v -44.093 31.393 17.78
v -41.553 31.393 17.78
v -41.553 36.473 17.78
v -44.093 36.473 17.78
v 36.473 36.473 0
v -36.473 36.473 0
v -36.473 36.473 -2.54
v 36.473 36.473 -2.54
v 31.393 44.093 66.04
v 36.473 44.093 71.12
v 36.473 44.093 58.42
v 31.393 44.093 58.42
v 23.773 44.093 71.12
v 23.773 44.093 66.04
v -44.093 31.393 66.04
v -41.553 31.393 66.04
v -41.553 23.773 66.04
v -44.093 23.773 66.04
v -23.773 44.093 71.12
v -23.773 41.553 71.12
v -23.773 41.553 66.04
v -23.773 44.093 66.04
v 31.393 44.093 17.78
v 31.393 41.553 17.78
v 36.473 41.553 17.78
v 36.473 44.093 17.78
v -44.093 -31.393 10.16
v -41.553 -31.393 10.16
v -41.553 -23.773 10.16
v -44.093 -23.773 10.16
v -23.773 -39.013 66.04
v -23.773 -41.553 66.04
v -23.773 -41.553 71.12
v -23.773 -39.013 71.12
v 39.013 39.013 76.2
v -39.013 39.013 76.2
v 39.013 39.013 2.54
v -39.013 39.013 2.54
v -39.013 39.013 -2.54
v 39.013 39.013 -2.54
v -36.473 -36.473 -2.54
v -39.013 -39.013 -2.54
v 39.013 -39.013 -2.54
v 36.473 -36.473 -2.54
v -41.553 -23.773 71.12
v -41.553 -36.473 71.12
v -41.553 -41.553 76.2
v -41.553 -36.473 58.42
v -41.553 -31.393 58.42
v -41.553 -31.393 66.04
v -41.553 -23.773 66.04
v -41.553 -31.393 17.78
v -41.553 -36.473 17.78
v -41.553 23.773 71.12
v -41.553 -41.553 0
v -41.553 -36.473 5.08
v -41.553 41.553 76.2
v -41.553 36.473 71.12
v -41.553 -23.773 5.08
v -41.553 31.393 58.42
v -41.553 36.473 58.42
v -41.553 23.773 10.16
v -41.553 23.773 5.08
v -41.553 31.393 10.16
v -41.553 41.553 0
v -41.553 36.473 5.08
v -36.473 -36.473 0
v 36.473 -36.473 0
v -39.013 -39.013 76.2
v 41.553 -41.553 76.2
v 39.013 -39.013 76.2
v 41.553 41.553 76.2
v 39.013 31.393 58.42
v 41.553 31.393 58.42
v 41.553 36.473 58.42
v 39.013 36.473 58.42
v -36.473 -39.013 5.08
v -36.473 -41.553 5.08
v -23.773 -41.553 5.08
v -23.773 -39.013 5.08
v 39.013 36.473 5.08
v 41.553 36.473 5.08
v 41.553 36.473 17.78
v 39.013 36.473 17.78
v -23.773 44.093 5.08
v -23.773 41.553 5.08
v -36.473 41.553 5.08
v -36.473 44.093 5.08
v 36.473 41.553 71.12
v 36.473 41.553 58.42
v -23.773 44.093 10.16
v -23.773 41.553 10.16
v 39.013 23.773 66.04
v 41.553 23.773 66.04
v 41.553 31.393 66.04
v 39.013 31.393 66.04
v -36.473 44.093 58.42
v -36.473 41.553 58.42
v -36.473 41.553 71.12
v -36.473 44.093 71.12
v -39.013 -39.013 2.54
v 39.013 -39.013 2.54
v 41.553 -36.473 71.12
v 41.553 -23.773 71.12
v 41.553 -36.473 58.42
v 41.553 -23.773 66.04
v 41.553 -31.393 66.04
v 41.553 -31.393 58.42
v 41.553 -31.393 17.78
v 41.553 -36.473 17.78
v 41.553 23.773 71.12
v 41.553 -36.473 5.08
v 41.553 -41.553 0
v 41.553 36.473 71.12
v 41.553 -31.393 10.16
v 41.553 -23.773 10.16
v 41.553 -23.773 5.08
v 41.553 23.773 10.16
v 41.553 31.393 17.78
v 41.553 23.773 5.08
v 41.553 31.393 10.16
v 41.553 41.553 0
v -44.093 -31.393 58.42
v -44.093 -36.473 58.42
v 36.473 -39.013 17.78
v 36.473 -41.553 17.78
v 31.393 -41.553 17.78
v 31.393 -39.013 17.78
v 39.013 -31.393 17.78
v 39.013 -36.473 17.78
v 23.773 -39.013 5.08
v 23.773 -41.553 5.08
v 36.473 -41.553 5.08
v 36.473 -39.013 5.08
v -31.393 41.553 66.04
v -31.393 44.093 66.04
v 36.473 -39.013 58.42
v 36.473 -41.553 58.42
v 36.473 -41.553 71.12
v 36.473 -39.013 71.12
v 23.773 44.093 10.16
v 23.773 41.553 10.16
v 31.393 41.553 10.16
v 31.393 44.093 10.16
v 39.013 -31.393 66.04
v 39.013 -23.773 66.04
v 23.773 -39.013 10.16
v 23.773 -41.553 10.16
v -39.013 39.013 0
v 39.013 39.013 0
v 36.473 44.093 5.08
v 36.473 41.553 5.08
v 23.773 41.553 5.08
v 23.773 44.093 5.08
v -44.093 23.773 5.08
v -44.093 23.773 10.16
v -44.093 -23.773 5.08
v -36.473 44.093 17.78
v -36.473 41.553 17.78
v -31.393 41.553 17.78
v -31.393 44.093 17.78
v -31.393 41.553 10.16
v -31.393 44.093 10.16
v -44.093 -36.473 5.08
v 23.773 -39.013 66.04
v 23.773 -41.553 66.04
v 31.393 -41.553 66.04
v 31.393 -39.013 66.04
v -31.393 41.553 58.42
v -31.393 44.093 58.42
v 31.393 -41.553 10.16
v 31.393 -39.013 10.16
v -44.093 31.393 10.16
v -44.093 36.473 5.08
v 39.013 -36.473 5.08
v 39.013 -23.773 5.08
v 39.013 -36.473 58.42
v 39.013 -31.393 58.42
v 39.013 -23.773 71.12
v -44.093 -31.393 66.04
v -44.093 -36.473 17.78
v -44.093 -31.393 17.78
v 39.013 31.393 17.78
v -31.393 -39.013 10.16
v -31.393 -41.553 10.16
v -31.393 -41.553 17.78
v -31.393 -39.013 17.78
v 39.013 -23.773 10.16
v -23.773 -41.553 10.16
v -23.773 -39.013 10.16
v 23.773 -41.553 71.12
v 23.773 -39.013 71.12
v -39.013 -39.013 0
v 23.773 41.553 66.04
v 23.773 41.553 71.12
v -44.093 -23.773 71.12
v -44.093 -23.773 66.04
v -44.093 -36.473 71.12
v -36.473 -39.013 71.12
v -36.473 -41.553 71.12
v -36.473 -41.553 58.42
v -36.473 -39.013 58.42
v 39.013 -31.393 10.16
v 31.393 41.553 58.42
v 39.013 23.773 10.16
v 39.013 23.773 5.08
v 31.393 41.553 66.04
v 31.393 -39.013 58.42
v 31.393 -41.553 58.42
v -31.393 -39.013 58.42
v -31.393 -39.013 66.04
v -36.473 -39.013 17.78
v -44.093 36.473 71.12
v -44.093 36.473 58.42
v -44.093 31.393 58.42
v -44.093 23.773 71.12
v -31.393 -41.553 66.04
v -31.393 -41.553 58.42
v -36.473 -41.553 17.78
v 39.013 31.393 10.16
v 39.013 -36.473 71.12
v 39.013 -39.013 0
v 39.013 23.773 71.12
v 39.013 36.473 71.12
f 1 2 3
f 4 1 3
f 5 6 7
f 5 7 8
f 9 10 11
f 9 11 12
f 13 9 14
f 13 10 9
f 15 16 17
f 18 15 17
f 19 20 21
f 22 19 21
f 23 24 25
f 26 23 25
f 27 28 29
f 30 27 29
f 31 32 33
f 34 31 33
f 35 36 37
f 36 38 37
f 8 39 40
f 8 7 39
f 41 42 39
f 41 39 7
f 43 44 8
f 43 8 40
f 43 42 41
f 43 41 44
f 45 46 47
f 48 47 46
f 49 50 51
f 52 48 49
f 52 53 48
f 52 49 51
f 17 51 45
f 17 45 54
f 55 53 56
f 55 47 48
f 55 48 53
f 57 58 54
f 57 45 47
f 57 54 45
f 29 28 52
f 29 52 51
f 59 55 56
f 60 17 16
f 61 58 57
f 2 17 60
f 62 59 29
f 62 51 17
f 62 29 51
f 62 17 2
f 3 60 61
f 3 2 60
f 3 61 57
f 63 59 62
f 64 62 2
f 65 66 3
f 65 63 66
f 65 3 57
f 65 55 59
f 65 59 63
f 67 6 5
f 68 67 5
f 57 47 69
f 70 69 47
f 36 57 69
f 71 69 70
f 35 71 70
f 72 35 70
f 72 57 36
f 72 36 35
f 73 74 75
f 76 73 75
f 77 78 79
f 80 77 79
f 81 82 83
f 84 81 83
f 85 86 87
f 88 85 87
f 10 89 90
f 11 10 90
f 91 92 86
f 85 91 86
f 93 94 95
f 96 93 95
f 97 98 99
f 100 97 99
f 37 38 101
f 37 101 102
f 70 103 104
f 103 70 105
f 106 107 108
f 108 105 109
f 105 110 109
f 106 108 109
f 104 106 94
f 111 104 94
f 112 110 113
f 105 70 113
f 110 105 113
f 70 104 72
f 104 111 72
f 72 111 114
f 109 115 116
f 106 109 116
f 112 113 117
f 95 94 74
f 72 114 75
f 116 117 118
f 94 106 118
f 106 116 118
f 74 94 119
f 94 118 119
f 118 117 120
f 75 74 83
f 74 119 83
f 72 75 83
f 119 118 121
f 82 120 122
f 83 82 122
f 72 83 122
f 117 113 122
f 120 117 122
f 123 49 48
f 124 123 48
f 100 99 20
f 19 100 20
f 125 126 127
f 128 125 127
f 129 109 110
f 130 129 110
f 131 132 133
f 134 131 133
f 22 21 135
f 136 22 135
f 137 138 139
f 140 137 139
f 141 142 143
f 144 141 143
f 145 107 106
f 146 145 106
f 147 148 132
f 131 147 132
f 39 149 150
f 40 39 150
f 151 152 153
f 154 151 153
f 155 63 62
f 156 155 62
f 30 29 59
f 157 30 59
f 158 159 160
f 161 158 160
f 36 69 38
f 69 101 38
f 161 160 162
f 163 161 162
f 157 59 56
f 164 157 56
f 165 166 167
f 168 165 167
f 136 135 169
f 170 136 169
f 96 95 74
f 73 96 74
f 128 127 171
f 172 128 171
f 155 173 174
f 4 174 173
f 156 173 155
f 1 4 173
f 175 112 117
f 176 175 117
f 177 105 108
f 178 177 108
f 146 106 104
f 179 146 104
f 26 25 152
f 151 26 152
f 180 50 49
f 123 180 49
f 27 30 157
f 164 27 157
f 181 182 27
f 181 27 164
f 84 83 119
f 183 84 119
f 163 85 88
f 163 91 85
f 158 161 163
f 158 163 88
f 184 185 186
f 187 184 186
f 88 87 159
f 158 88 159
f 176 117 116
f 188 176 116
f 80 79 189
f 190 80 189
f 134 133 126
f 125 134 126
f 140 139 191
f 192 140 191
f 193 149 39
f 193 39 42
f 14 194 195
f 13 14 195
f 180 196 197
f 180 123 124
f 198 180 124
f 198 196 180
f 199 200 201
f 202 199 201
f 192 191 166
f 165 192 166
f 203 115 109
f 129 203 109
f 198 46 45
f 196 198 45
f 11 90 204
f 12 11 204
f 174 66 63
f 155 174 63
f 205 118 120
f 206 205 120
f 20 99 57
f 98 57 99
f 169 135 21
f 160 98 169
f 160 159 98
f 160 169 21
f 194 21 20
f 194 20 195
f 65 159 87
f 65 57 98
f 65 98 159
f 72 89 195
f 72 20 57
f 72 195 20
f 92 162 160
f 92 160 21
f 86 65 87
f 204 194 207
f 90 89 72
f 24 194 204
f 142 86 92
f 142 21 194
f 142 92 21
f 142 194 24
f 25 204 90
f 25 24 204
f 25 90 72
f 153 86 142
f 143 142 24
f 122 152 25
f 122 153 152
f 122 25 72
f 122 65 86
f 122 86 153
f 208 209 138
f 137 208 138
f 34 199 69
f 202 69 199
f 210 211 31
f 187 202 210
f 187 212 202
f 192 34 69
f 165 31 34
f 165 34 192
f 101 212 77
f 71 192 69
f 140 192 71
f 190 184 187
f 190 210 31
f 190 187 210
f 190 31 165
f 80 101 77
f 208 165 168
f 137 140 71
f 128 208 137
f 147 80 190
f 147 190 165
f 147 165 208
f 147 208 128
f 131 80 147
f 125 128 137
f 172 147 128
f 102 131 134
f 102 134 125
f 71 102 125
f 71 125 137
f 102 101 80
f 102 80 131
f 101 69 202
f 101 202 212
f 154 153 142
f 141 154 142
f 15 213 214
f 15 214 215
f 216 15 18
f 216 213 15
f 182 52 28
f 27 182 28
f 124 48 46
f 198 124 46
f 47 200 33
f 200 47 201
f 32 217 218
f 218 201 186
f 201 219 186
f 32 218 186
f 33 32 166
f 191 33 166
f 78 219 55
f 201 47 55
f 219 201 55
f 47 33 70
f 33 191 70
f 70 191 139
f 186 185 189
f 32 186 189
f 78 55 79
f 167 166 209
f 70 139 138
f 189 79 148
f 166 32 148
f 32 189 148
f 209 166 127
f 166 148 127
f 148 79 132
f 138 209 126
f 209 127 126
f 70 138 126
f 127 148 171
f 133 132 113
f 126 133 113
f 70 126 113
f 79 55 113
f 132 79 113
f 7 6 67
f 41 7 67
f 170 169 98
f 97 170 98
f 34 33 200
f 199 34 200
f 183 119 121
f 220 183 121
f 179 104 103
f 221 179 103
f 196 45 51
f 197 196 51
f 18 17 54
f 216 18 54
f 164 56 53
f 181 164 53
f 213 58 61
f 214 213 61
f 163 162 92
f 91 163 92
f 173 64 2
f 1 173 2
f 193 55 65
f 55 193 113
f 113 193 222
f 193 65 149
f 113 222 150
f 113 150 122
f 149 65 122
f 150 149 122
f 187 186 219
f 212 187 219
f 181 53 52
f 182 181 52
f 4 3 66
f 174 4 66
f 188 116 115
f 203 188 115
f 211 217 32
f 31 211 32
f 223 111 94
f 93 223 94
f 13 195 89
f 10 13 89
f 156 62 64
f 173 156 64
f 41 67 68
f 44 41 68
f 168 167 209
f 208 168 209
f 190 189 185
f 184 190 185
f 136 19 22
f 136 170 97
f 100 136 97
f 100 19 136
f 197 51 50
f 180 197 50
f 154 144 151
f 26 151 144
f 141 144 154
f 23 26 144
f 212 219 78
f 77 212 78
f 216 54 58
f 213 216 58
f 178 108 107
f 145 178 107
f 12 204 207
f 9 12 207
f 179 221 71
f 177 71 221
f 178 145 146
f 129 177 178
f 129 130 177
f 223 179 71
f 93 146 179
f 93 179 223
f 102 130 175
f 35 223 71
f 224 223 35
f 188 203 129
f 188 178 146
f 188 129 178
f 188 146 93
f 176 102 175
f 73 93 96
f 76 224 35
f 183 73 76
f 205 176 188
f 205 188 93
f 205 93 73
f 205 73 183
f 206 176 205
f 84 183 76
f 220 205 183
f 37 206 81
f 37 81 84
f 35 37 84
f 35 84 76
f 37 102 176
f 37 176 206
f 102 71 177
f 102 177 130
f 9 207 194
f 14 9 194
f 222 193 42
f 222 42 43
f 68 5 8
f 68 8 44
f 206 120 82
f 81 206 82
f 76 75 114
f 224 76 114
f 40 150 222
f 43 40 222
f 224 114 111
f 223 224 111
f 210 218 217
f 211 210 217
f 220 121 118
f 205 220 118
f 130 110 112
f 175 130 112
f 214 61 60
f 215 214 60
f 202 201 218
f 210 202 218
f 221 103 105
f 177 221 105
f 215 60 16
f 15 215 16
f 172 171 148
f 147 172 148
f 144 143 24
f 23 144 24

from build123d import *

# Parameters (mm, degrees)
F0_W      = 83.106392
F0_H      = 83.106392
F1_DEPTH  = 76.2
F2_T      = -2.54
F3_W      = 78.026392
F3_H      = 78.026392
F3_W_2    = 72.946392
F3_H_2    = 72.946392
F4_DEPTH  = 2.54
F8_DEPTH  = 2.54
F9_DEPTH  = 25.4
F11_DEPTH = 2.54
F12_DEPTH = 25.4


with BuildPart() as f1:
    # F0 (on Top) → F1 (new body)
    with BuildSketch(Plane.XY):
        Rectangle(F0_W, F0_H)
    extrude(amount=F1_DEPTH)

    # F2
    f2_openings = [f1.faces().sort_by_distance(p)[0] for p in [
        (0, 0, 76.2),
    ]]
    offset(amount=F2_T, openings=f2_openings)

    # F3 (on face) → F4 (join)
    with BuildSketch(Plane(origin=(0, 0, 0), x_dir=(1, 0, 0), z_dir=(0, 0, -1))):
        Rectangle(F3_W, F3_H)
        Rectangle(F3_W_2, F3_H_2, mode=Mode.SUBTRACT)
    extrude(amount=F4_DEPTH)

    # F5 (on face) → F8 (join)
    with BuildSketch(Plane(origin=(-41.553196, 0, 0), x_dir=(0, -1, 0), z_dir=(-1, 0, 0))):
        Polygon((-23.773196, 71.12), (-36.473196, 71.12), (-36.473196, 58.42), (-31.393196, 58.42), (-31.393196, 66.04), (-23.773196, 66.04), align=None)
        Polygon((36.473196, 58.42), (36.473196, 71.12), (23.773196, 71.12), (23.773196, 66.04), (31.393196, 66.04), (31.393196, 58.42), align=None)
        Polygon((36.473196, 17.78), (31.393196, 17.78), (31.393196, 10.16), (23.773196, 10.16), (23.773196, 5.08), (36.473196, 5.08), align=None)
        Polygon((-36.473196, 17.78), (-36.473196, 5.08), (-23.773196, 5.08), (-23.773196, 10.16), (-31.393196, 10.16), (-31.393196, 17.78), align=None)
    extrude(amount=F8_DEPTH)

    # F7 (on face) → F9 (cut)
    with BuildSketch(Plane.YZ.offset(41.553196)):
        Polygon((-23.773196, 71.12), (-36.473196, 71.12), (-36.473196, 58.42), (-31.393196, 58.42), (-31.393196, 66.04), (-23.773196, 66.04), align=None)
        Polygon((36.473196, 58.42), (36.473196, 71.12), (23.773196, 71.12), (23.773196, 66.04), (31.393196, 66.04), (31.393196, 58.42), align=None)
        Polygon((23.773196, 5.08), (36.473196, 5.08), (36.473196, 17.78), (31.393196, 17.78), (31.393196, 10.16), (23.773196, 10.16), align=None)
        Polygon((-36.473196, 17.78), (-36.473196, 5.08), (-23.773196, 5.08), (-23.773196, 10.16), (-31.393196, 10.16), (-31.393196, 17.78), align=None)
    extrude(amount=-F9_DEPTH, mode=Mode.SUBTRACT)

    # F10 (on face) → F11 (join)
    with BuildSketch(Plane(origin=(0, 41.553196, 0), x_dir=(-1, 0, 0), z_dir=(0, 1, 0))):
        Polygon((36.473196, 58.42), (36.473196, 71.12), (23.773196, 71.12), (23.773196, 66.04), (31.393196, 66.04), (31.393196, 58.42), align=None)
        Polygon((23.773196, 5.08), (36.473196, 5.08), (36.473196, 17.78), (31.393196, 17.78), (31.393196, 10.16), (23.773196, 10.16), align=None)
        Polygon((-36.473196, 17.78), (-36.473196, 5.08), (-23.773196, 5.08), (-23.773196, 10.16), (-31.393196, 10.16), (-31.393196, 17.78), align=None)
        Polygon((-23.773196, 71.12), (-36.473196, 71.12), (-36.473196, 58.42), (-31.393196, 58.42), (-31.393196, 66.04), (-23.773196, 66.04), align=None)
    extrude(amount=F11_DEPTH)

    # F6 (on face) → F12 (cut)
    with BuildSketch(Plane.XZ.offset(41.553196)):
        Polygon((-23.773196, 71.12), (-36.473196, 71.12), (-36.473196, 58.42), (-31.393196, 58.42), (-31.393196, 66.04), (-23.773196, 66.04), align=None)
        Polygon((-36.473196, 17.78), (-36.473196, 5.08), (-23.773196, 5.08), (-23.773196, 10.16), (-31.393196, 10.16), (-31.393196, 17.78), align=None)
        Polygon((23.773196, 5.08), (36.473196, 5.08), (36.473196, 17.78), (31.393196, 17.78), (31.393196, 10.16), (23.773196, 10.16), align=None)
        Polygon((36.473196, 58.42), (36.473196, 71.12), (23.773196, 71.12), (23.773196, 66.04), (31.393196, 66.04), (31.393196, 58.42), align=None)
    extrude(amount=-F12_DEPTH, mode=Mode.SUBTRACT)


solid = f1.part
